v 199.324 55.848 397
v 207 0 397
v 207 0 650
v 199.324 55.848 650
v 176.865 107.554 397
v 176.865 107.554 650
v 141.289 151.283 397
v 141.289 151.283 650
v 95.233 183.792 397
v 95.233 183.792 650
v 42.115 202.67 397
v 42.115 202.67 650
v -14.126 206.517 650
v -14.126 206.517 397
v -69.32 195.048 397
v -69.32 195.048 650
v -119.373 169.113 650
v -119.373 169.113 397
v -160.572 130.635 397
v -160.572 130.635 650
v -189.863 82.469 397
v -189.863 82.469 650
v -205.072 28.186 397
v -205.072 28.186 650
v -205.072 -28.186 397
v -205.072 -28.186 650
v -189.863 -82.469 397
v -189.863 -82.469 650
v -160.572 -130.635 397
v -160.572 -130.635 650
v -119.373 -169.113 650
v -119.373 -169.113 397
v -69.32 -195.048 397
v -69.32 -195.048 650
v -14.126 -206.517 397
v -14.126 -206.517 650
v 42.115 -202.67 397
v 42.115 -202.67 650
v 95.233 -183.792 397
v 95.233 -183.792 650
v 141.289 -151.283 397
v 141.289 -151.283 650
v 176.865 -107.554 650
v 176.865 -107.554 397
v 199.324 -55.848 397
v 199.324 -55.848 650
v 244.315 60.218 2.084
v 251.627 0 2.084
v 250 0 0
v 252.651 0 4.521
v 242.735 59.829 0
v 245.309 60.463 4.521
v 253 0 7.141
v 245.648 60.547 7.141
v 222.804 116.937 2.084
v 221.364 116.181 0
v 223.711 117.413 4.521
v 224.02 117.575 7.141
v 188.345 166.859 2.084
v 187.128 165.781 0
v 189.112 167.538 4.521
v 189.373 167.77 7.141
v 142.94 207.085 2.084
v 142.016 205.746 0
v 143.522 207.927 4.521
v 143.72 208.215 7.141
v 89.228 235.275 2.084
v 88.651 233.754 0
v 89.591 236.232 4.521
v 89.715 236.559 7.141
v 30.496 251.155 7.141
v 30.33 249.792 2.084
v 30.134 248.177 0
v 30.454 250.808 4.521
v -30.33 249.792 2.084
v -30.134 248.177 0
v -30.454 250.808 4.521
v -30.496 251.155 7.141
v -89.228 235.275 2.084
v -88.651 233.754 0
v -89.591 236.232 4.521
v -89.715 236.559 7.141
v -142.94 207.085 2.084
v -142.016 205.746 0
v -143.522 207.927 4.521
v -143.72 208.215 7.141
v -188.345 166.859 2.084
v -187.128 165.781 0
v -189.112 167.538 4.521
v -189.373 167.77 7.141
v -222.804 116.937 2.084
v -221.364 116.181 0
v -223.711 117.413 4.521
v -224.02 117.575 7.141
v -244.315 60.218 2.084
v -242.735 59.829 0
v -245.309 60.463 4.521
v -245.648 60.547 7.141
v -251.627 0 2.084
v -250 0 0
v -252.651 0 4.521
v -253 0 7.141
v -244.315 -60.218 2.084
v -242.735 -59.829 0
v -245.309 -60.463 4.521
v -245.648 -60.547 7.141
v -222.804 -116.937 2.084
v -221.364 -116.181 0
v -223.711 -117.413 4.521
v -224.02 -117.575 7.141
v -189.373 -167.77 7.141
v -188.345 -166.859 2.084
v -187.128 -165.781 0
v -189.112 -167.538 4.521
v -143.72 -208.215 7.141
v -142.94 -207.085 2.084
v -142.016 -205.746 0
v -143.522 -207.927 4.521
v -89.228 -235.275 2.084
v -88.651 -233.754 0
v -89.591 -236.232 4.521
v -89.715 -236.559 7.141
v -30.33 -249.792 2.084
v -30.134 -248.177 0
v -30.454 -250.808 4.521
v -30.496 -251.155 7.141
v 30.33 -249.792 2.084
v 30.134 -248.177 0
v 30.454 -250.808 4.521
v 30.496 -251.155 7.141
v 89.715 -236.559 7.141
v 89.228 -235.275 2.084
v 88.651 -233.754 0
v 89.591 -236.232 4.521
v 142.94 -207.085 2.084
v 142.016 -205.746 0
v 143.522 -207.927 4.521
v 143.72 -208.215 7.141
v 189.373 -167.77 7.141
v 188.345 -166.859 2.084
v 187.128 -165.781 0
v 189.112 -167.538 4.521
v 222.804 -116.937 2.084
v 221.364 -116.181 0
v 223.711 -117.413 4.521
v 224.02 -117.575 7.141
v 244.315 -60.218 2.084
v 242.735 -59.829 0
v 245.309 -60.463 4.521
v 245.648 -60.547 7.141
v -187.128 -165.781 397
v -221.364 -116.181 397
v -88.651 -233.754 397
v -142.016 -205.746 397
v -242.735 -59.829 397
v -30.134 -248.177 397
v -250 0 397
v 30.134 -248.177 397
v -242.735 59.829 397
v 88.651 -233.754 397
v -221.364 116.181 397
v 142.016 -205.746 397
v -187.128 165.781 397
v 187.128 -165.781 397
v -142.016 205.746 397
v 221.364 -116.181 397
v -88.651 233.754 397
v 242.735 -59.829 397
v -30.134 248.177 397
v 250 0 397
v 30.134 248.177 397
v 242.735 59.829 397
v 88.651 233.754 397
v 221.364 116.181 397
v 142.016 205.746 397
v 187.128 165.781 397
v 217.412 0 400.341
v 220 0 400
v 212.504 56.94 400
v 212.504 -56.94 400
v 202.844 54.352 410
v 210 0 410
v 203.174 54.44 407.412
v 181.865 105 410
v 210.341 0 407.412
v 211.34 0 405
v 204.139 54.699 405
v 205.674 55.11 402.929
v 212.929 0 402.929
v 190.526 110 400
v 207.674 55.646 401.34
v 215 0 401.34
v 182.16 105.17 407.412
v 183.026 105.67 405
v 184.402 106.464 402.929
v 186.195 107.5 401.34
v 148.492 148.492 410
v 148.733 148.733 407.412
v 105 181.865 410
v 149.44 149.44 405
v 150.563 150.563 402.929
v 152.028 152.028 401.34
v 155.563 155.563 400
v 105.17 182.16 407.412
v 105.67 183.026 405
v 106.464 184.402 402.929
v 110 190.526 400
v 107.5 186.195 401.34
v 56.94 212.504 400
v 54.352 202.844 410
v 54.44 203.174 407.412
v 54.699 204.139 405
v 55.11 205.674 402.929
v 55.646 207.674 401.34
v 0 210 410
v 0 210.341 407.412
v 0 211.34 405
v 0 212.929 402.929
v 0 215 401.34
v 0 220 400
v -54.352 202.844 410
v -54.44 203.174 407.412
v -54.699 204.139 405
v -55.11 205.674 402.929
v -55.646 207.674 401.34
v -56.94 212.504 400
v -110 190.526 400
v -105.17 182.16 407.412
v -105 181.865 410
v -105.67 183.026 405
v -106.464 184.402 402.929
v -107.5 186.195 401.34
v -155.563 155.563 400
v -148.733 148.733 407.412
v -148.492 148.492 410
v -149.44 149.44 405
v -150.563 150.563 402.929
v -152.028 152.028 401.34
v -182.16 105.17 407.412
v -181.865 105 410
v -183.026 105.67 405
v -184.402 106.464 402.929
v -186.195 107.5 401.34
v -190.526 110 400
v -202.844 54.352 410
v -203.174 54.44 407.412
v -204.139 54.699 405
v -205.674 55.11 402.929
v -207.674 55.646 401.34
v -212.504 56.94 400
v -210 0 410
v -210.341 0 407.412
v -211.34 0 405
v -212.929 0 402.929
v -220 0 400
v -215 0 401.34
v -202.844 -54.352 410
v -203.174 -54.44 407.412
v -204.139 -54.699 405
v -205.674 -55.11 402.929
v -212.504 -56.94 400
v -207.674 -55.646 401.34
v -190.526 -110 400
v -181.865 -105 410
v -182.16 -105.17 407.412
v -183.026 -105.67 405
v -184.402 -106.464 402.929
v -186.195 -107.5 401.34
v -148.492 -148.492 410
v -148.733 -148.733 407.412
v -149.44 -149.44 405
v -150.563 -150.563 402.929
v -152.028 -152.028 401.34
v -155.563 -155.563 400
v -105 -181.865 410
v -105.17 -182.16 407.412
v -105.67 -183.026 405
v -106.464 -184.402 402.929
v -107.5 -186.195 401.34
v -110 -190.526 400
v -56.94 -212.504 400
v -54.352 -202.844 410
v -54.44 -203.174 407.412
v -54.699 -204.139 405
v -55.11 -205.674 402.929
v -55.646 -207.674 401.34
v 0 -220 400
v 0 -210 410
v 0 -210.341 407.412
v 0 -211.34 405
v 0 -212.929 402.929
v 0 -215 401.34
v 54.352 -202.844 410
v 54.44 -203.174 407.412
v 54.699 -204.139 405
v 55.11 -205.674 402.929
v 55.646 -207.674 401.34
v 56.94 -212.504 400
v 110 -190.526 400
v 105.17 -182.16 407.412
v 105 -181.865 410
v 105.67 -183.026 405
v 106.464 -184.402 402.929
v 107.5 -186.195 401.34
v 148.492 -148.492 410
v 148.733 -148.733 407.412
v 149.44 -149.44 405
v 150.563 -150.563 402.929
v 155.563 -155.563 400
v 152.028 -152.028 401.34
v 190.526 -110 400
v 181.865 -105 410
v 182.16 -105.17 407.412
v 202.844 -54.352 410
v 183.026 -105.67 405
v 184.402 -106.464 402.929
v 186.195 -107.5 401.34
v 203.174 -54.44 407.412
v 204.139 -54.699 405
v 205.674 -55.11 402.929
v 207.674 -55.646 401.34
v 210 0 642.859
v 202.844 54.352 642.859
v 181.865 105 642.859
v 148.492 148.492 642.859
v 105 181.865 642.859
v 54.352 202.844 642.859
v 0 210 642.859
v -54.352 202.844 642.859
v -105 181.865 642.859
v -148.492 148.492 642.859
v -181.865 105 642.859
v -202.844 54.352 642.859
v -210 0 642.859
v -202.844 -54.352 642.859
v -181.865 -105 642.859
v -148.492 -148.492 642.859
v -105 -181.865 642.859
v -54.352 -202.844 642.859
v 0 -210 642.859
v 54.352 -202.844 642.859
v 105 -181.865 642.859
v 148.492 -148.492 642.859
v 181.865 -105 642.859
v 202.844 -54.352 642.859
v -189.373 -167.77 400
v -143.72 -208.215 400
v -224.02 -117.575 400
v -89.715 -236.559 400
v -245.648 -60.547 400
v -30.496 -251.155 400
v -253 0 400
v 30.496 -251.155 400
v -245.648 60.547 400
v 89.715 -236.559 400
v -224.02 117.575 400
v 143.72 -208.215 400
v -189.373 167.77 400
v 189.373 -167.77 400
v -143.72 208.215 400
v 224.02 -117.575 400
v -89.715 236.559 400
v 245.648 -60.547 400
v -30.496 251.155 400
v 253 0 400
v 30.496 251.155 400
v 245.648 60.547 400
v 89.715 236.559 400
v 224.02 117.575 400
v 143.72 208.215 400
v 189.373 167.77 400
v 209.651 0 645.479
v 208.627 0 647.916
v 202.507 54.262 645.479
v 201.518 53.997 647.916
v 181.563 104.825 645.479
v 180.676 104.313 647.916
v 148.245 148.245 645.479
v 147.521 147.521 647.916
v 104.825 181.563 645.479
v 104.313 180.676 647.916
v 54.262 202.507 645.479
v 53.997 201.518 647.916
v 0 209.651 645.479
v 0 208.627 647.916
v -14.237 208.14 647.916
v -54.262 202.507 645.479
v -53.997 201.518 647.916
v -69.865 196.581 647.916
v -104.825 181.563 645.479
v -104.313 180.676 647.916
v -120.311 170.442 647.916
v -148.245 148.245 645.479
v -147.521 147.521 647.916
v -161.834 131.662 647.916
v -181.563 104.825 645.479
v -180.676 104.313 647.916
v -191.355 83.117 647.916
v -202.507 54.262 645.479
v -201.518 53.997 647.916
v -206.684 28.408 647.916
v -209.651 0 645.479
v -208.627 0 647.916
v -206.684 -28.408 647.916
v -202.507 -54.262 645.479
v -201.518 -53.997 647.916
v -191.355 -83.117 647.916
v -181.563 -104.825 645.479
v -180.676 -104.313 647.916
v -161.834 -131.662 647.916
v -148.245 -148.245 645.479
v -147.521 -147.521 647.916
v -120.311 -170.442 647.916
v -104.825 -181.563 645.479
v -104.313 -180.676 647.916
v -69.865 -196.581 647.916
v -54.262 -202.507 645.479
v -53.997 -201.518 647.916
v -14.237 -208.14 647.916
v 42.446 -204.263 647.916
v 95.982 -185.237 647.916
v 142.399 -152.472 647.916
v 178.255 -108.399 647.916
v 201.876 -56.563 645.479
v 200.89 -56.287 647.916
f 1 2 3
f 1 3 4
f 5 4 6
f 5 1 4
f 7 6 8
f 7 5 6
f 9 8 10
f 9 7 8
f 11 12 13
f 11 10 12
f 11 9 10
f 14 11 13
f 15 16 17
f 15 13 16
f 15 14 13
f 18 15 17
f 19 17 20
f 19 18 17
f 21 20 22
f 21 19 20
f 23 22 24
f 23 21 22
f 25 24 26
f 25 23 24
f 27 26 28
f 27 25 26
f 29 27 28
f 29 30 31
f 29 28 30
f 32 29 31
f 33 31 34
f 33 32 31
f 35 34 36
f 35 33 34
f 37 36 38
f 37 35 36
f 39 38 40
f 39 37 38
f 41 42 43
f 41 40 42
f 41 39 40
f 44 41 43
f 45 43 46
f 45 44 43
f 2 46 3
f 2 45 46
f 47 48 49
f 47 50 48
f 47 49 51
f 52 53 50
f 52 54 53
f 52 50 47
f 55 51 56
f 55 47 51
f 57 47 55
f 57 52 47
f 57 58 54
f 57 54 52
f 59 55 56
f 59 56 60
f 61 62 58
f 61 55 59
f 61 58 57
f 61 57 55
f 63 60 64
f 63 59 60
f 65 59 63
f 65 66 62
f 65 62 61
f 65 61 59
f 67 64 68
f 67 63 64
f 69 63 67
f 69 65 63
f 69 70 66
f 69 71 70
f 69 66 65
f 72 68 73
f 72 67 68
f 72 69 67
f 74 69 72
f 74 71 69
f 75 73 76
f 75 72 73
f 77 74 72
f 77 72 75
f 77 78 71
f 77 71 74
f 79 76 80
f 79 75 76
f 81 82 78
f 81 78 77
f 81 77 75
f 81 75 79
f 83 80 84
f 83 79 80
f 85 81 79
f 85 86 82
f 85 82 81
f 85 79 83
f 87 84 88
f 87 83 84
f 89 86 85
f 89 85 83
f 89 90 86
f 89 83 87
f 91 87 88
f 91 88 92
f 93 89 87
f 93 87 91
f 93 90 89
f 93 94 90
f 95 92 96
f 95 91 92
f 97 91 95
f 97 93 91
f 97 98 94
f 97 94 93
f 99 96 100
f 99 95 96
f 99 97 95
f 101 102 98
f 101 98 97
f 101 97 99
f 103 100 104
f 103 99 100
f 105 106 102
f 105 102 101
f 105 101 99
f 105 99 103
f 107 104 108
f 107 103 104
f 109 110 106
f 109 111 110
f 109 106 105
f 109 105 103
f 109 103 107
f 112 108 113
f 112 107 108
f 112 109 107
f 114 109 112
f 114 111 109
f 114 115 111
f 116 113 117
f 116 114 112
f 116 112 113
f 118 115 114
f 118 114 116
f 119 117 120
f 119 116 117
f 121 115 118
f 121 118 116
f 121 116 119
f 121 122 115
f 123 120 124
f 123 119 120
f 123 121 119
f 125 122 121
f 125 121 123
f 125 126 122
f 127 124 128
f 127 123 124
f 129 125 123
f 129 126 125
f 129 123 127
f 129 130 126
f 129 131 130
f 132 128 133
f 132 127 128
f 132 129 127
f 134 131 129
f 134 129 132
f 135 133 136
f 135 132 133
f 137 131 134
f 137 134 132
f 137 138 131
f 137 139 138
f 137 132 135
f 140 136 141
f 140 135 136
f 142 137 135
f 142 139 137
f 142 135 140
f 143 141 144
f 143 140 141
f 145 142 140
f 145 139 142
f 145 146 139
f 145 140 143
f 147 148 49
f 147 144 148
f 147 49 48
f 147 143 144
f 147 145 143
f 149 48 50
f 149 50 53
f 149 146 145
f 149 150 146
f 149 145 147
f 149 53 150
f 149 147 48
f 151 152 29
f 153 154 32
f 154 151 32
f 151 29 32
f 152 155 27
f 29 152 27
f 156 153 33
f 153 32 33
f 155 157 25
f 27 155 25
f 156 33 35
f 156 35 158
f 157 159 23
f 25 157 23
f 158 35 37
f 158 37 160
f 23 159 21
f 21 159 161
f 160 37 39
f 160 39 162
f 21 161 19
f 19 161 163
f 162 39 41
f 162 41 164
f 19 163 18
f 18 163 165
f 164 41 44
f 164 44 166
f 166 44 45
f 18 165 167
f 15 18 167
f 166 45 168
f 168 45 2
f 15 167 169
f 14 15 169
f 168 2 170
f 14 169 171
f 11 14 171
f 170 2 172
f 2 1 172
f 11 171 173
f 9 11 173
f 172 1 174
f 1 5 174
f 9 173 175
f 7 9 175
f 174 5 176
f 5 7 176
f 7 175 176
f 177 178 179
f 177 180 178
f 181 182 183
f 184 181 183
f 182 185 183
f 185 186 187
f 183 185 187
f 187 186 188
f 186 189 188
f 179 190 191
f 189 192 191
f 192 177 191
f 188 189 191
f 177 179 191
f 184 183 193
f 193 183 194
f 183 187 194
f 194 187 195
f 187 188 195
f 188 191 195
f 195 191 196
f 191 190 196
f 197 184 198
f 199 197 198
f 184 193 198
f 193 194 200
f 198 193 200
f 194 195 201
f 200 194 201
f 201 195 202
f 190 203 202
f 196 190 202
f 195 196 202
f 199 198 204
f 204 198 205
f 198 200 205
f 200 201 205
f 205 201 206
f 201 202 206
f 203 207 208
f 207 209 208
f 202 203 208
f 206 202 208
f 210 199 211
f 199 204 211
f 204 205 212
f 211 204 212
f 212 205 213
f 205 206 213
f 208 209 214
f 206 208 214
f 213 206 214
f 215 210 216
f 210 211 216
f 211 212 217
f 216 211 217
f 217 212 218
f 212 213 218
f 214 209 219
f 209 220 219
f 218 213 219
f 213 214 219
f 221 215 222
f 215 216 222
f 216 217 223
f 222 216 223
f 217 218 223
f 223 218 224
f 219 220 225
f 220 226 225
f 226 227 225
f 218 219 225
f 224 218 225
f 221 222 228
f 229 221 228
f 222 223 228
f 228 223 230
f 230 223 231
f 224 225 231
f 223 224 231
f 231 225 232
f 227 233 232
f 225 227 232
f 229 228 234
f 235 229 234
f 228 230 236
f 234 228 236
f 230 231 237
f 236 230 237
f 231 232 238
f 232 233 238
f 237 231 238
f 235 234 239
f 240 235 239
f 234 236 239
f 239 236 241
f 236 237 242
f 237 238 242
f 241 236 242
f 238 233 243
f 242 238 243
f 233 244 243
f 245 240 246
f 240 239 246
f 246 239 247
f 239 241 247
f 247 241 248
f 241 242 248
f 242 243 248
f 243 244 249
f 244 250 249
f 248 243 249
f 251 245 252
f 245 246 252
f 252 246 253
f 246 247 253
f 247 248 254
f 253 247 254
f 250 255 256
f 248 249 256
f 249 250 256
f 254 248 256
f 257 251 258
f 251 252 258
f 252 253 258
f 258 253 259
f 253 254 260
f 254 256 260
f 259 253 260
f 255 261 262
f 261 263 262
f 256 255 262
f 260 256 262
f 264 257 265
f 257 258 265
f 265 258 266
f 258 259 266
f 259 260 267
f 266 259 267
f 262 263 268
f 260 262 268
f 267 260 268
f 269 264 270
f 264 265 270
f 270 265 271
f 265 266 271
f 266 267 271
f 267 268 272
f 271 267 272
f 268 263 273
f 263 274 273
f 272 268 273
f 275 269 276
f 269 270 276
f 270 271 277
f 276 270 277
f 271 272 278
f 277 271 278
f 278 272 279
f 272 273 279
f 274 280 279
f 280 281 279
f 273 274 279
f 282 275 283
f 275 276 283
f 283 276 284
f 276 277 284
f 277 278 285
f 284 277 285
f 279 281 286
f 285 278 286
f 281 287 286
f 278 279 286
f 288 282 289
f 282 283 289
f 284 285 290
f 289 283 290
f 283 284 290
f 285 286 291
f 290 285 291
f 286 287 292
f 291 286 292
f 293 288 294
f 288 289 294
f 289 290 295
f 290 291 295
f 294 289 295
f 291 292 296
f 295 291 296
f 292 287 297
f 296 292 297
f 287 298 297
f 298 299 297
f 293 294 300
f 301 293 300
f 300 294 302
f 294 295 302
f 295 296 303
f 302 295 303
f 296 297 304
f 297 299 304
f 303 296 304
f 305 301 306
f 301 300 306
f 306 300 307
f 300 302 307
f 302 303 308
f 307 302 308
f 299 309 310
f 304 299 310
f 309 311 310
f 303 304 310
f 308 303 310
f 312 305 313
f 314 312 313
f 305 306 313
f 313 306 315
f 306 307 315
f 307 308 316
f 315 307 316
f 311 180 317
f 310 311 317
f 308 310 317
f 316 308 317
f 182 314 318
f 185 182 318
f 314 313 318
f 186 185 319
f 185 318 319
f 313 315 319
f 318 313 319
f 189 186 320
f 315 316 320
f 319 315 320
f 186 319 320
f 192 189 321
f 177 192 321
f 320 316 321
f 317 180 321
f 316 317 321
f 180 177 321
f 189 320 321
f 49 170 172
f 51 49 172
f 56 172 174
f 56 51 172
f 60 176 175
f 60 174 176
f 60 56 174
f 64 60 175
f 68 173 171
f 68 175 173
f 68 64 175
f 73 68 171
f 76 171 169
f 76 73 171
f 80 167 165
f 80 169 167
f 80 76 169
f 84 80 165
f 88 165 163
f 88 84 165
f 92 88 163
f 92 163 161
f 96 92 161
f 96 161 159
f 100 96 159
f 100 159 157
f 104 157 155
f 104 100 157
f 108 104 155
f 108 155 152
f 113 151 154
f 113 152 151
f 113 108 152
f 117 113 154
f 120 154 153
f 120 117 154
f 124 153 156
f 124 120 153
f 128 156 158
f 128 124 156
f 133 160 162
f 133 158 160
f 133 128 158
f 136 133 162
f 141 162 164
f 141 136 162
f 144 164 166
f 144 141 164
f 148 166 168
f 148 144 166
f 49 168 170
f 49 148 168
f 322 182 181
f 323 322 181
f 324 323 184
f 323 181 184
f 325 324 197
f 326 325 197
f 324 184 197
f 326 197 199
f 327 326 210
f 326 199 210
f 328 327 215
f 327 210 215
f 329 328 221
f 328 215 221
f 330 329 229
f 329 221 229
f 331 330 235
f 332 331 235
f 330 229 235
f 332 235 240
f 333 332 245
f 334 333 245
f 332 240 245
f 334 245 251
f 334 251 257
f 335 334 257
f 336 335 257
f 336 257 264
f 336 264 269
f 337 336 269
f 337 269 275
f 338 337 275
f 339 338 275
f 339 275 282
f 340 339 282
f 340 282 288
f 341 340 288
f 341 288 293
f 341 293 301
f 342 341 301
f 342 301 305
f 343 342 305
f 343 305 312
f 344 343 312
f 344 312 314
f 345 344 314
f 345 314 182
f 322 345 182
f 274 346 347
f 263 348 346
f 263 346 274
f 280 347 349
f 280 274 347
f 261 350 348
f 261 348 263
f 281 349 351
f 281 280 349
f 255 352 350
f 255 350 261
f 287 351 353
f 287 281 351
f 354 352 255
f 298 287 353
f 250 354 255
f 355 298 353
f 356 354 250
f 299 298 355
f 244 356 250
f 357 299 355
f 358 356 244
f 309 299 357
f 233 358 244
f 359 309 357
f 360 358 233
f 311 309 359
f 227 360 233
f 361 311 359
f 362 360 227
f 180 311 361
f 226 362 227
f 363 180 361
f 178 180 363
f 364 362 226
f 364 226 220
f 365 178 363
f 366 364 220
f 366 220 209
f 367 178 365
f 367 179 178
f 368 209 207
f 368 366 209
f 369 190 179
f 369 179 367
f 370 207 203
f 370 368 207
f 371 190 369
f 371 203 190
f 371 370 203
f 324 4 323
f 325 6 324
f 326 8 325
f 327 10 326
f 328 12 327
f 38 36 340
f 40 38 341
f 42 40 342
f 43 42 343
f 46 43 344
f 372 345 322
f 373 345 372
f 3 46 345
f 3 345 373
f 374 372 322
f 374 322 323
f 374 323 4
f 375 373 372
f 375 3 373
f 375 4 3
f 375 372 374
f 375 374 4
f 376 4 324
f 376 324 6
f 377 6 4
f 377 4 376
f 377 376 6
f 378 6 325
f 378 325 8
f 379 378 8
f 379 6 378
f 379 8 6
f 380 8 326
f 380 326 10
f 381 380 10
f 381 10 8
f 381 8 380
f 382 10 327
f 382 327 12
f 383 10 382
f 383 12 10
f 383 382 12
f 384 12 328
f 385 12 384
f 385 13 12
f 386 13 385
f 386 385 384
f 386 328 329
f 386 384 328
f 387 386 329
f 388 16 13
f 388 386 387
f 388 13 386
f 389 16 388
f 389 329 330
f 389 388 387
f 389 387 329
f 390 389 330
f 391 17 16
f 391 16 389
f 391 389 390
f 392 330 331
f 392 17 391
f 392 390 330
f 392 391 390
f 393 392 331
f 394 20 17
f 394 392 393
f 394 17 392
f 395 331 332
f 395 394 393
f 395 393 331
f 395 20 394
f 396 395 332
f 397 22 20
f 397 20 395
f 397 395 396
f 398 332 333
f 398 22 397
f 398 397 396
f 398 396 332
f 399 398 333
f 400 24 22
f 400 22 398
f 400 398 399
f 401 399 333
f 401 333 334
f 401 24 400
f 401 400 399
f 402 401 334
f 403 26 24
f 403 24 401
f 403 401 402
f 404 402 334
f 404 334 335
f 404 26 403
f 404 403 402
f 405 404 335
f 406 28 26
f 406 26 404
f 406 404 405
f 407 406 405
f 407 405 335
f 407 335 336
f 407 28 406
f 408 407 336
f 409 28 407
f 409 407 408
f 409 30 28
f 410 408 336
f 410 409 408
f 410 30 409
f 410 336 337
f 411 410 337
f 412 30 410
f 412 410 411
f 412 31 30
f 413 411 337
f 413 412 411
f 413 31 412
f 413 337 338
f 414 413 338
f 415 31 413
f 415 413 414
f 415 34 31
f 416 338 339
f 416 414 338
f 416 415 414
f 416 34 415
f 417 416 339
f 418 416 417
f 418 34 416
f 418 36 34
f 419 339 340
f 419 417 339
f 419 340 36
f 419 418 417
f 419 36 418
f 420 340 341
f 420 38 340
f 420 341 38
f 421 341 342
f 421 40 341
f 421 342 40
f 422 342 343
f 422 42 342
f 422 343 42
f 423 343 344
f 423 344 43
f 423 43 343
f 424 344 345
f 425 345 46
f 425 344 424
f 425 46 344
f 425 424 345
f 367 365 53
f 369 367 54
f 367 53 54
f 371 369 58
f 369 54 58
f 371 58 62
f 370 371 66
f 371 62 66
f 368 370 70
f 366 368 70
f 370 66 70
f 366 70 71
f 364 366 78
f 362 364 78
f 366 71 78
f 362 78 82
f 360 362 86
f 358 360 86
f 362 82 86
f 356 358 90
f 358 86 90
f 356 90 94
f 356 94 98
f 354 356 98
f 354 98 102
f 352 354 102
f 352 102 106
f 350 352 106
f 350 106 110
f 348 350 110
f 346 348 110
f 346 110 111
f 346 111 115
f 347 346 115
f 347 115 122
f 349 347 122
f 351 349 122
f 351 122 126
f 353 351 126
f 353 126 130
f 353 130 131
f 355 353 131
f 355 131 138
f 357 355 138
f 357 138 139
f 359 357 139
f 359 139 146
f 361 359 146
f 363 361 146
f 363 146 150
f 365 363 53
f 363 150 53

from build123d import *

# Parameters (mm, degrees)
SKETCH1_R           = 253
BOSS_EXTRUDE1_DEPTH = 400
SKETCH2_R           = 210
BOSS_EXTRUDE2_DEPTH = 250
SHELL1_T            = -3
FILLET1_R           = 10


with BuildPart() as part:
    # Sketch1 → Boss-Extrude1 (new body)
    with BuildSketch(Plane.XY):
        Circle(SKETCH1_R)
    extrude(amount=BOSS_EXTRUDE1_DEPTH)

    # Sketch2 → Boss-Extrude2 (add)
    with BuildSketch(Plane.XY.offset(400)):
        Circle(SKETCH2_R)
    extrude(amount=BOSS_EXTRUDE2_DEPTH)

    # Shell1
    shell1_openings = [part.faces().sort_by_distance(p)[0] for p in [
        (0, 0, 0),
        (0, 0, 650),
    ]]
    offset(amount=SHELL1_T, openings=shell1_openings, kind=Kind.INTERSECTION)

    # Fillet1
    # the kernel refuses this fillet: 10 mm, written as the material it adds along each edge
    with BuildSketch(Plane(origin=(0, 0, 400), x_dir=(1, 0, 0), z_dir=(0, -1, 0))) as fillet1_piece_1:
        with BuildLine():
            CenterArc((210 + FILLET1_R, FILLET1_R), FILLET1_R, 180, 90)
            Line((210, FILLET1_R), (210, 0))
            Line((210, 0), (210 + FILLET1_R, 0))
        make_face()
    revolve(axis=Axis((0, 0, 400), (0, 0, 1)))
    # the kernel refuses this fillet: 10 mm, written as the material it takes off along each edge
    with BuildSketch(Plane(origin=(0, 0, 0), x_dir=(1, 0, 0), z_dir=(0, -1, 0))) as fillet1_2_piece_1:
        with BuildLine():
            CenterArc((243, 7.141428429), FILLET1_R, 314.427004001, 45.572995999)
            Line((250, 0), (253, 0))
            Line((253, 0), (253, 7.141428429))
        make_face()
    revolve(axis=Axis((0, 0, 0), (0, 0, 1)), mode=Mode.SUBTRACT)
    with BuildSketch(Plane(origin=(0, 0, 650), x_dir=(1, 0, 0), z_dir=(0, -1, 0))) as fillet1_2_piece_2:
        with BuildLine():
            CenterArc((200, -7.141428429), FILLET1_R, 0, 45.572995999)
            Line((207, 0), (210, 0))
            Line((210, 0), (210, -7.141428429))
        make_face()
    revolve(axis=Axis((0, 0, 650), (0, 0, 1)), mode=Mode.SUBTRACT)


solid = part.part
